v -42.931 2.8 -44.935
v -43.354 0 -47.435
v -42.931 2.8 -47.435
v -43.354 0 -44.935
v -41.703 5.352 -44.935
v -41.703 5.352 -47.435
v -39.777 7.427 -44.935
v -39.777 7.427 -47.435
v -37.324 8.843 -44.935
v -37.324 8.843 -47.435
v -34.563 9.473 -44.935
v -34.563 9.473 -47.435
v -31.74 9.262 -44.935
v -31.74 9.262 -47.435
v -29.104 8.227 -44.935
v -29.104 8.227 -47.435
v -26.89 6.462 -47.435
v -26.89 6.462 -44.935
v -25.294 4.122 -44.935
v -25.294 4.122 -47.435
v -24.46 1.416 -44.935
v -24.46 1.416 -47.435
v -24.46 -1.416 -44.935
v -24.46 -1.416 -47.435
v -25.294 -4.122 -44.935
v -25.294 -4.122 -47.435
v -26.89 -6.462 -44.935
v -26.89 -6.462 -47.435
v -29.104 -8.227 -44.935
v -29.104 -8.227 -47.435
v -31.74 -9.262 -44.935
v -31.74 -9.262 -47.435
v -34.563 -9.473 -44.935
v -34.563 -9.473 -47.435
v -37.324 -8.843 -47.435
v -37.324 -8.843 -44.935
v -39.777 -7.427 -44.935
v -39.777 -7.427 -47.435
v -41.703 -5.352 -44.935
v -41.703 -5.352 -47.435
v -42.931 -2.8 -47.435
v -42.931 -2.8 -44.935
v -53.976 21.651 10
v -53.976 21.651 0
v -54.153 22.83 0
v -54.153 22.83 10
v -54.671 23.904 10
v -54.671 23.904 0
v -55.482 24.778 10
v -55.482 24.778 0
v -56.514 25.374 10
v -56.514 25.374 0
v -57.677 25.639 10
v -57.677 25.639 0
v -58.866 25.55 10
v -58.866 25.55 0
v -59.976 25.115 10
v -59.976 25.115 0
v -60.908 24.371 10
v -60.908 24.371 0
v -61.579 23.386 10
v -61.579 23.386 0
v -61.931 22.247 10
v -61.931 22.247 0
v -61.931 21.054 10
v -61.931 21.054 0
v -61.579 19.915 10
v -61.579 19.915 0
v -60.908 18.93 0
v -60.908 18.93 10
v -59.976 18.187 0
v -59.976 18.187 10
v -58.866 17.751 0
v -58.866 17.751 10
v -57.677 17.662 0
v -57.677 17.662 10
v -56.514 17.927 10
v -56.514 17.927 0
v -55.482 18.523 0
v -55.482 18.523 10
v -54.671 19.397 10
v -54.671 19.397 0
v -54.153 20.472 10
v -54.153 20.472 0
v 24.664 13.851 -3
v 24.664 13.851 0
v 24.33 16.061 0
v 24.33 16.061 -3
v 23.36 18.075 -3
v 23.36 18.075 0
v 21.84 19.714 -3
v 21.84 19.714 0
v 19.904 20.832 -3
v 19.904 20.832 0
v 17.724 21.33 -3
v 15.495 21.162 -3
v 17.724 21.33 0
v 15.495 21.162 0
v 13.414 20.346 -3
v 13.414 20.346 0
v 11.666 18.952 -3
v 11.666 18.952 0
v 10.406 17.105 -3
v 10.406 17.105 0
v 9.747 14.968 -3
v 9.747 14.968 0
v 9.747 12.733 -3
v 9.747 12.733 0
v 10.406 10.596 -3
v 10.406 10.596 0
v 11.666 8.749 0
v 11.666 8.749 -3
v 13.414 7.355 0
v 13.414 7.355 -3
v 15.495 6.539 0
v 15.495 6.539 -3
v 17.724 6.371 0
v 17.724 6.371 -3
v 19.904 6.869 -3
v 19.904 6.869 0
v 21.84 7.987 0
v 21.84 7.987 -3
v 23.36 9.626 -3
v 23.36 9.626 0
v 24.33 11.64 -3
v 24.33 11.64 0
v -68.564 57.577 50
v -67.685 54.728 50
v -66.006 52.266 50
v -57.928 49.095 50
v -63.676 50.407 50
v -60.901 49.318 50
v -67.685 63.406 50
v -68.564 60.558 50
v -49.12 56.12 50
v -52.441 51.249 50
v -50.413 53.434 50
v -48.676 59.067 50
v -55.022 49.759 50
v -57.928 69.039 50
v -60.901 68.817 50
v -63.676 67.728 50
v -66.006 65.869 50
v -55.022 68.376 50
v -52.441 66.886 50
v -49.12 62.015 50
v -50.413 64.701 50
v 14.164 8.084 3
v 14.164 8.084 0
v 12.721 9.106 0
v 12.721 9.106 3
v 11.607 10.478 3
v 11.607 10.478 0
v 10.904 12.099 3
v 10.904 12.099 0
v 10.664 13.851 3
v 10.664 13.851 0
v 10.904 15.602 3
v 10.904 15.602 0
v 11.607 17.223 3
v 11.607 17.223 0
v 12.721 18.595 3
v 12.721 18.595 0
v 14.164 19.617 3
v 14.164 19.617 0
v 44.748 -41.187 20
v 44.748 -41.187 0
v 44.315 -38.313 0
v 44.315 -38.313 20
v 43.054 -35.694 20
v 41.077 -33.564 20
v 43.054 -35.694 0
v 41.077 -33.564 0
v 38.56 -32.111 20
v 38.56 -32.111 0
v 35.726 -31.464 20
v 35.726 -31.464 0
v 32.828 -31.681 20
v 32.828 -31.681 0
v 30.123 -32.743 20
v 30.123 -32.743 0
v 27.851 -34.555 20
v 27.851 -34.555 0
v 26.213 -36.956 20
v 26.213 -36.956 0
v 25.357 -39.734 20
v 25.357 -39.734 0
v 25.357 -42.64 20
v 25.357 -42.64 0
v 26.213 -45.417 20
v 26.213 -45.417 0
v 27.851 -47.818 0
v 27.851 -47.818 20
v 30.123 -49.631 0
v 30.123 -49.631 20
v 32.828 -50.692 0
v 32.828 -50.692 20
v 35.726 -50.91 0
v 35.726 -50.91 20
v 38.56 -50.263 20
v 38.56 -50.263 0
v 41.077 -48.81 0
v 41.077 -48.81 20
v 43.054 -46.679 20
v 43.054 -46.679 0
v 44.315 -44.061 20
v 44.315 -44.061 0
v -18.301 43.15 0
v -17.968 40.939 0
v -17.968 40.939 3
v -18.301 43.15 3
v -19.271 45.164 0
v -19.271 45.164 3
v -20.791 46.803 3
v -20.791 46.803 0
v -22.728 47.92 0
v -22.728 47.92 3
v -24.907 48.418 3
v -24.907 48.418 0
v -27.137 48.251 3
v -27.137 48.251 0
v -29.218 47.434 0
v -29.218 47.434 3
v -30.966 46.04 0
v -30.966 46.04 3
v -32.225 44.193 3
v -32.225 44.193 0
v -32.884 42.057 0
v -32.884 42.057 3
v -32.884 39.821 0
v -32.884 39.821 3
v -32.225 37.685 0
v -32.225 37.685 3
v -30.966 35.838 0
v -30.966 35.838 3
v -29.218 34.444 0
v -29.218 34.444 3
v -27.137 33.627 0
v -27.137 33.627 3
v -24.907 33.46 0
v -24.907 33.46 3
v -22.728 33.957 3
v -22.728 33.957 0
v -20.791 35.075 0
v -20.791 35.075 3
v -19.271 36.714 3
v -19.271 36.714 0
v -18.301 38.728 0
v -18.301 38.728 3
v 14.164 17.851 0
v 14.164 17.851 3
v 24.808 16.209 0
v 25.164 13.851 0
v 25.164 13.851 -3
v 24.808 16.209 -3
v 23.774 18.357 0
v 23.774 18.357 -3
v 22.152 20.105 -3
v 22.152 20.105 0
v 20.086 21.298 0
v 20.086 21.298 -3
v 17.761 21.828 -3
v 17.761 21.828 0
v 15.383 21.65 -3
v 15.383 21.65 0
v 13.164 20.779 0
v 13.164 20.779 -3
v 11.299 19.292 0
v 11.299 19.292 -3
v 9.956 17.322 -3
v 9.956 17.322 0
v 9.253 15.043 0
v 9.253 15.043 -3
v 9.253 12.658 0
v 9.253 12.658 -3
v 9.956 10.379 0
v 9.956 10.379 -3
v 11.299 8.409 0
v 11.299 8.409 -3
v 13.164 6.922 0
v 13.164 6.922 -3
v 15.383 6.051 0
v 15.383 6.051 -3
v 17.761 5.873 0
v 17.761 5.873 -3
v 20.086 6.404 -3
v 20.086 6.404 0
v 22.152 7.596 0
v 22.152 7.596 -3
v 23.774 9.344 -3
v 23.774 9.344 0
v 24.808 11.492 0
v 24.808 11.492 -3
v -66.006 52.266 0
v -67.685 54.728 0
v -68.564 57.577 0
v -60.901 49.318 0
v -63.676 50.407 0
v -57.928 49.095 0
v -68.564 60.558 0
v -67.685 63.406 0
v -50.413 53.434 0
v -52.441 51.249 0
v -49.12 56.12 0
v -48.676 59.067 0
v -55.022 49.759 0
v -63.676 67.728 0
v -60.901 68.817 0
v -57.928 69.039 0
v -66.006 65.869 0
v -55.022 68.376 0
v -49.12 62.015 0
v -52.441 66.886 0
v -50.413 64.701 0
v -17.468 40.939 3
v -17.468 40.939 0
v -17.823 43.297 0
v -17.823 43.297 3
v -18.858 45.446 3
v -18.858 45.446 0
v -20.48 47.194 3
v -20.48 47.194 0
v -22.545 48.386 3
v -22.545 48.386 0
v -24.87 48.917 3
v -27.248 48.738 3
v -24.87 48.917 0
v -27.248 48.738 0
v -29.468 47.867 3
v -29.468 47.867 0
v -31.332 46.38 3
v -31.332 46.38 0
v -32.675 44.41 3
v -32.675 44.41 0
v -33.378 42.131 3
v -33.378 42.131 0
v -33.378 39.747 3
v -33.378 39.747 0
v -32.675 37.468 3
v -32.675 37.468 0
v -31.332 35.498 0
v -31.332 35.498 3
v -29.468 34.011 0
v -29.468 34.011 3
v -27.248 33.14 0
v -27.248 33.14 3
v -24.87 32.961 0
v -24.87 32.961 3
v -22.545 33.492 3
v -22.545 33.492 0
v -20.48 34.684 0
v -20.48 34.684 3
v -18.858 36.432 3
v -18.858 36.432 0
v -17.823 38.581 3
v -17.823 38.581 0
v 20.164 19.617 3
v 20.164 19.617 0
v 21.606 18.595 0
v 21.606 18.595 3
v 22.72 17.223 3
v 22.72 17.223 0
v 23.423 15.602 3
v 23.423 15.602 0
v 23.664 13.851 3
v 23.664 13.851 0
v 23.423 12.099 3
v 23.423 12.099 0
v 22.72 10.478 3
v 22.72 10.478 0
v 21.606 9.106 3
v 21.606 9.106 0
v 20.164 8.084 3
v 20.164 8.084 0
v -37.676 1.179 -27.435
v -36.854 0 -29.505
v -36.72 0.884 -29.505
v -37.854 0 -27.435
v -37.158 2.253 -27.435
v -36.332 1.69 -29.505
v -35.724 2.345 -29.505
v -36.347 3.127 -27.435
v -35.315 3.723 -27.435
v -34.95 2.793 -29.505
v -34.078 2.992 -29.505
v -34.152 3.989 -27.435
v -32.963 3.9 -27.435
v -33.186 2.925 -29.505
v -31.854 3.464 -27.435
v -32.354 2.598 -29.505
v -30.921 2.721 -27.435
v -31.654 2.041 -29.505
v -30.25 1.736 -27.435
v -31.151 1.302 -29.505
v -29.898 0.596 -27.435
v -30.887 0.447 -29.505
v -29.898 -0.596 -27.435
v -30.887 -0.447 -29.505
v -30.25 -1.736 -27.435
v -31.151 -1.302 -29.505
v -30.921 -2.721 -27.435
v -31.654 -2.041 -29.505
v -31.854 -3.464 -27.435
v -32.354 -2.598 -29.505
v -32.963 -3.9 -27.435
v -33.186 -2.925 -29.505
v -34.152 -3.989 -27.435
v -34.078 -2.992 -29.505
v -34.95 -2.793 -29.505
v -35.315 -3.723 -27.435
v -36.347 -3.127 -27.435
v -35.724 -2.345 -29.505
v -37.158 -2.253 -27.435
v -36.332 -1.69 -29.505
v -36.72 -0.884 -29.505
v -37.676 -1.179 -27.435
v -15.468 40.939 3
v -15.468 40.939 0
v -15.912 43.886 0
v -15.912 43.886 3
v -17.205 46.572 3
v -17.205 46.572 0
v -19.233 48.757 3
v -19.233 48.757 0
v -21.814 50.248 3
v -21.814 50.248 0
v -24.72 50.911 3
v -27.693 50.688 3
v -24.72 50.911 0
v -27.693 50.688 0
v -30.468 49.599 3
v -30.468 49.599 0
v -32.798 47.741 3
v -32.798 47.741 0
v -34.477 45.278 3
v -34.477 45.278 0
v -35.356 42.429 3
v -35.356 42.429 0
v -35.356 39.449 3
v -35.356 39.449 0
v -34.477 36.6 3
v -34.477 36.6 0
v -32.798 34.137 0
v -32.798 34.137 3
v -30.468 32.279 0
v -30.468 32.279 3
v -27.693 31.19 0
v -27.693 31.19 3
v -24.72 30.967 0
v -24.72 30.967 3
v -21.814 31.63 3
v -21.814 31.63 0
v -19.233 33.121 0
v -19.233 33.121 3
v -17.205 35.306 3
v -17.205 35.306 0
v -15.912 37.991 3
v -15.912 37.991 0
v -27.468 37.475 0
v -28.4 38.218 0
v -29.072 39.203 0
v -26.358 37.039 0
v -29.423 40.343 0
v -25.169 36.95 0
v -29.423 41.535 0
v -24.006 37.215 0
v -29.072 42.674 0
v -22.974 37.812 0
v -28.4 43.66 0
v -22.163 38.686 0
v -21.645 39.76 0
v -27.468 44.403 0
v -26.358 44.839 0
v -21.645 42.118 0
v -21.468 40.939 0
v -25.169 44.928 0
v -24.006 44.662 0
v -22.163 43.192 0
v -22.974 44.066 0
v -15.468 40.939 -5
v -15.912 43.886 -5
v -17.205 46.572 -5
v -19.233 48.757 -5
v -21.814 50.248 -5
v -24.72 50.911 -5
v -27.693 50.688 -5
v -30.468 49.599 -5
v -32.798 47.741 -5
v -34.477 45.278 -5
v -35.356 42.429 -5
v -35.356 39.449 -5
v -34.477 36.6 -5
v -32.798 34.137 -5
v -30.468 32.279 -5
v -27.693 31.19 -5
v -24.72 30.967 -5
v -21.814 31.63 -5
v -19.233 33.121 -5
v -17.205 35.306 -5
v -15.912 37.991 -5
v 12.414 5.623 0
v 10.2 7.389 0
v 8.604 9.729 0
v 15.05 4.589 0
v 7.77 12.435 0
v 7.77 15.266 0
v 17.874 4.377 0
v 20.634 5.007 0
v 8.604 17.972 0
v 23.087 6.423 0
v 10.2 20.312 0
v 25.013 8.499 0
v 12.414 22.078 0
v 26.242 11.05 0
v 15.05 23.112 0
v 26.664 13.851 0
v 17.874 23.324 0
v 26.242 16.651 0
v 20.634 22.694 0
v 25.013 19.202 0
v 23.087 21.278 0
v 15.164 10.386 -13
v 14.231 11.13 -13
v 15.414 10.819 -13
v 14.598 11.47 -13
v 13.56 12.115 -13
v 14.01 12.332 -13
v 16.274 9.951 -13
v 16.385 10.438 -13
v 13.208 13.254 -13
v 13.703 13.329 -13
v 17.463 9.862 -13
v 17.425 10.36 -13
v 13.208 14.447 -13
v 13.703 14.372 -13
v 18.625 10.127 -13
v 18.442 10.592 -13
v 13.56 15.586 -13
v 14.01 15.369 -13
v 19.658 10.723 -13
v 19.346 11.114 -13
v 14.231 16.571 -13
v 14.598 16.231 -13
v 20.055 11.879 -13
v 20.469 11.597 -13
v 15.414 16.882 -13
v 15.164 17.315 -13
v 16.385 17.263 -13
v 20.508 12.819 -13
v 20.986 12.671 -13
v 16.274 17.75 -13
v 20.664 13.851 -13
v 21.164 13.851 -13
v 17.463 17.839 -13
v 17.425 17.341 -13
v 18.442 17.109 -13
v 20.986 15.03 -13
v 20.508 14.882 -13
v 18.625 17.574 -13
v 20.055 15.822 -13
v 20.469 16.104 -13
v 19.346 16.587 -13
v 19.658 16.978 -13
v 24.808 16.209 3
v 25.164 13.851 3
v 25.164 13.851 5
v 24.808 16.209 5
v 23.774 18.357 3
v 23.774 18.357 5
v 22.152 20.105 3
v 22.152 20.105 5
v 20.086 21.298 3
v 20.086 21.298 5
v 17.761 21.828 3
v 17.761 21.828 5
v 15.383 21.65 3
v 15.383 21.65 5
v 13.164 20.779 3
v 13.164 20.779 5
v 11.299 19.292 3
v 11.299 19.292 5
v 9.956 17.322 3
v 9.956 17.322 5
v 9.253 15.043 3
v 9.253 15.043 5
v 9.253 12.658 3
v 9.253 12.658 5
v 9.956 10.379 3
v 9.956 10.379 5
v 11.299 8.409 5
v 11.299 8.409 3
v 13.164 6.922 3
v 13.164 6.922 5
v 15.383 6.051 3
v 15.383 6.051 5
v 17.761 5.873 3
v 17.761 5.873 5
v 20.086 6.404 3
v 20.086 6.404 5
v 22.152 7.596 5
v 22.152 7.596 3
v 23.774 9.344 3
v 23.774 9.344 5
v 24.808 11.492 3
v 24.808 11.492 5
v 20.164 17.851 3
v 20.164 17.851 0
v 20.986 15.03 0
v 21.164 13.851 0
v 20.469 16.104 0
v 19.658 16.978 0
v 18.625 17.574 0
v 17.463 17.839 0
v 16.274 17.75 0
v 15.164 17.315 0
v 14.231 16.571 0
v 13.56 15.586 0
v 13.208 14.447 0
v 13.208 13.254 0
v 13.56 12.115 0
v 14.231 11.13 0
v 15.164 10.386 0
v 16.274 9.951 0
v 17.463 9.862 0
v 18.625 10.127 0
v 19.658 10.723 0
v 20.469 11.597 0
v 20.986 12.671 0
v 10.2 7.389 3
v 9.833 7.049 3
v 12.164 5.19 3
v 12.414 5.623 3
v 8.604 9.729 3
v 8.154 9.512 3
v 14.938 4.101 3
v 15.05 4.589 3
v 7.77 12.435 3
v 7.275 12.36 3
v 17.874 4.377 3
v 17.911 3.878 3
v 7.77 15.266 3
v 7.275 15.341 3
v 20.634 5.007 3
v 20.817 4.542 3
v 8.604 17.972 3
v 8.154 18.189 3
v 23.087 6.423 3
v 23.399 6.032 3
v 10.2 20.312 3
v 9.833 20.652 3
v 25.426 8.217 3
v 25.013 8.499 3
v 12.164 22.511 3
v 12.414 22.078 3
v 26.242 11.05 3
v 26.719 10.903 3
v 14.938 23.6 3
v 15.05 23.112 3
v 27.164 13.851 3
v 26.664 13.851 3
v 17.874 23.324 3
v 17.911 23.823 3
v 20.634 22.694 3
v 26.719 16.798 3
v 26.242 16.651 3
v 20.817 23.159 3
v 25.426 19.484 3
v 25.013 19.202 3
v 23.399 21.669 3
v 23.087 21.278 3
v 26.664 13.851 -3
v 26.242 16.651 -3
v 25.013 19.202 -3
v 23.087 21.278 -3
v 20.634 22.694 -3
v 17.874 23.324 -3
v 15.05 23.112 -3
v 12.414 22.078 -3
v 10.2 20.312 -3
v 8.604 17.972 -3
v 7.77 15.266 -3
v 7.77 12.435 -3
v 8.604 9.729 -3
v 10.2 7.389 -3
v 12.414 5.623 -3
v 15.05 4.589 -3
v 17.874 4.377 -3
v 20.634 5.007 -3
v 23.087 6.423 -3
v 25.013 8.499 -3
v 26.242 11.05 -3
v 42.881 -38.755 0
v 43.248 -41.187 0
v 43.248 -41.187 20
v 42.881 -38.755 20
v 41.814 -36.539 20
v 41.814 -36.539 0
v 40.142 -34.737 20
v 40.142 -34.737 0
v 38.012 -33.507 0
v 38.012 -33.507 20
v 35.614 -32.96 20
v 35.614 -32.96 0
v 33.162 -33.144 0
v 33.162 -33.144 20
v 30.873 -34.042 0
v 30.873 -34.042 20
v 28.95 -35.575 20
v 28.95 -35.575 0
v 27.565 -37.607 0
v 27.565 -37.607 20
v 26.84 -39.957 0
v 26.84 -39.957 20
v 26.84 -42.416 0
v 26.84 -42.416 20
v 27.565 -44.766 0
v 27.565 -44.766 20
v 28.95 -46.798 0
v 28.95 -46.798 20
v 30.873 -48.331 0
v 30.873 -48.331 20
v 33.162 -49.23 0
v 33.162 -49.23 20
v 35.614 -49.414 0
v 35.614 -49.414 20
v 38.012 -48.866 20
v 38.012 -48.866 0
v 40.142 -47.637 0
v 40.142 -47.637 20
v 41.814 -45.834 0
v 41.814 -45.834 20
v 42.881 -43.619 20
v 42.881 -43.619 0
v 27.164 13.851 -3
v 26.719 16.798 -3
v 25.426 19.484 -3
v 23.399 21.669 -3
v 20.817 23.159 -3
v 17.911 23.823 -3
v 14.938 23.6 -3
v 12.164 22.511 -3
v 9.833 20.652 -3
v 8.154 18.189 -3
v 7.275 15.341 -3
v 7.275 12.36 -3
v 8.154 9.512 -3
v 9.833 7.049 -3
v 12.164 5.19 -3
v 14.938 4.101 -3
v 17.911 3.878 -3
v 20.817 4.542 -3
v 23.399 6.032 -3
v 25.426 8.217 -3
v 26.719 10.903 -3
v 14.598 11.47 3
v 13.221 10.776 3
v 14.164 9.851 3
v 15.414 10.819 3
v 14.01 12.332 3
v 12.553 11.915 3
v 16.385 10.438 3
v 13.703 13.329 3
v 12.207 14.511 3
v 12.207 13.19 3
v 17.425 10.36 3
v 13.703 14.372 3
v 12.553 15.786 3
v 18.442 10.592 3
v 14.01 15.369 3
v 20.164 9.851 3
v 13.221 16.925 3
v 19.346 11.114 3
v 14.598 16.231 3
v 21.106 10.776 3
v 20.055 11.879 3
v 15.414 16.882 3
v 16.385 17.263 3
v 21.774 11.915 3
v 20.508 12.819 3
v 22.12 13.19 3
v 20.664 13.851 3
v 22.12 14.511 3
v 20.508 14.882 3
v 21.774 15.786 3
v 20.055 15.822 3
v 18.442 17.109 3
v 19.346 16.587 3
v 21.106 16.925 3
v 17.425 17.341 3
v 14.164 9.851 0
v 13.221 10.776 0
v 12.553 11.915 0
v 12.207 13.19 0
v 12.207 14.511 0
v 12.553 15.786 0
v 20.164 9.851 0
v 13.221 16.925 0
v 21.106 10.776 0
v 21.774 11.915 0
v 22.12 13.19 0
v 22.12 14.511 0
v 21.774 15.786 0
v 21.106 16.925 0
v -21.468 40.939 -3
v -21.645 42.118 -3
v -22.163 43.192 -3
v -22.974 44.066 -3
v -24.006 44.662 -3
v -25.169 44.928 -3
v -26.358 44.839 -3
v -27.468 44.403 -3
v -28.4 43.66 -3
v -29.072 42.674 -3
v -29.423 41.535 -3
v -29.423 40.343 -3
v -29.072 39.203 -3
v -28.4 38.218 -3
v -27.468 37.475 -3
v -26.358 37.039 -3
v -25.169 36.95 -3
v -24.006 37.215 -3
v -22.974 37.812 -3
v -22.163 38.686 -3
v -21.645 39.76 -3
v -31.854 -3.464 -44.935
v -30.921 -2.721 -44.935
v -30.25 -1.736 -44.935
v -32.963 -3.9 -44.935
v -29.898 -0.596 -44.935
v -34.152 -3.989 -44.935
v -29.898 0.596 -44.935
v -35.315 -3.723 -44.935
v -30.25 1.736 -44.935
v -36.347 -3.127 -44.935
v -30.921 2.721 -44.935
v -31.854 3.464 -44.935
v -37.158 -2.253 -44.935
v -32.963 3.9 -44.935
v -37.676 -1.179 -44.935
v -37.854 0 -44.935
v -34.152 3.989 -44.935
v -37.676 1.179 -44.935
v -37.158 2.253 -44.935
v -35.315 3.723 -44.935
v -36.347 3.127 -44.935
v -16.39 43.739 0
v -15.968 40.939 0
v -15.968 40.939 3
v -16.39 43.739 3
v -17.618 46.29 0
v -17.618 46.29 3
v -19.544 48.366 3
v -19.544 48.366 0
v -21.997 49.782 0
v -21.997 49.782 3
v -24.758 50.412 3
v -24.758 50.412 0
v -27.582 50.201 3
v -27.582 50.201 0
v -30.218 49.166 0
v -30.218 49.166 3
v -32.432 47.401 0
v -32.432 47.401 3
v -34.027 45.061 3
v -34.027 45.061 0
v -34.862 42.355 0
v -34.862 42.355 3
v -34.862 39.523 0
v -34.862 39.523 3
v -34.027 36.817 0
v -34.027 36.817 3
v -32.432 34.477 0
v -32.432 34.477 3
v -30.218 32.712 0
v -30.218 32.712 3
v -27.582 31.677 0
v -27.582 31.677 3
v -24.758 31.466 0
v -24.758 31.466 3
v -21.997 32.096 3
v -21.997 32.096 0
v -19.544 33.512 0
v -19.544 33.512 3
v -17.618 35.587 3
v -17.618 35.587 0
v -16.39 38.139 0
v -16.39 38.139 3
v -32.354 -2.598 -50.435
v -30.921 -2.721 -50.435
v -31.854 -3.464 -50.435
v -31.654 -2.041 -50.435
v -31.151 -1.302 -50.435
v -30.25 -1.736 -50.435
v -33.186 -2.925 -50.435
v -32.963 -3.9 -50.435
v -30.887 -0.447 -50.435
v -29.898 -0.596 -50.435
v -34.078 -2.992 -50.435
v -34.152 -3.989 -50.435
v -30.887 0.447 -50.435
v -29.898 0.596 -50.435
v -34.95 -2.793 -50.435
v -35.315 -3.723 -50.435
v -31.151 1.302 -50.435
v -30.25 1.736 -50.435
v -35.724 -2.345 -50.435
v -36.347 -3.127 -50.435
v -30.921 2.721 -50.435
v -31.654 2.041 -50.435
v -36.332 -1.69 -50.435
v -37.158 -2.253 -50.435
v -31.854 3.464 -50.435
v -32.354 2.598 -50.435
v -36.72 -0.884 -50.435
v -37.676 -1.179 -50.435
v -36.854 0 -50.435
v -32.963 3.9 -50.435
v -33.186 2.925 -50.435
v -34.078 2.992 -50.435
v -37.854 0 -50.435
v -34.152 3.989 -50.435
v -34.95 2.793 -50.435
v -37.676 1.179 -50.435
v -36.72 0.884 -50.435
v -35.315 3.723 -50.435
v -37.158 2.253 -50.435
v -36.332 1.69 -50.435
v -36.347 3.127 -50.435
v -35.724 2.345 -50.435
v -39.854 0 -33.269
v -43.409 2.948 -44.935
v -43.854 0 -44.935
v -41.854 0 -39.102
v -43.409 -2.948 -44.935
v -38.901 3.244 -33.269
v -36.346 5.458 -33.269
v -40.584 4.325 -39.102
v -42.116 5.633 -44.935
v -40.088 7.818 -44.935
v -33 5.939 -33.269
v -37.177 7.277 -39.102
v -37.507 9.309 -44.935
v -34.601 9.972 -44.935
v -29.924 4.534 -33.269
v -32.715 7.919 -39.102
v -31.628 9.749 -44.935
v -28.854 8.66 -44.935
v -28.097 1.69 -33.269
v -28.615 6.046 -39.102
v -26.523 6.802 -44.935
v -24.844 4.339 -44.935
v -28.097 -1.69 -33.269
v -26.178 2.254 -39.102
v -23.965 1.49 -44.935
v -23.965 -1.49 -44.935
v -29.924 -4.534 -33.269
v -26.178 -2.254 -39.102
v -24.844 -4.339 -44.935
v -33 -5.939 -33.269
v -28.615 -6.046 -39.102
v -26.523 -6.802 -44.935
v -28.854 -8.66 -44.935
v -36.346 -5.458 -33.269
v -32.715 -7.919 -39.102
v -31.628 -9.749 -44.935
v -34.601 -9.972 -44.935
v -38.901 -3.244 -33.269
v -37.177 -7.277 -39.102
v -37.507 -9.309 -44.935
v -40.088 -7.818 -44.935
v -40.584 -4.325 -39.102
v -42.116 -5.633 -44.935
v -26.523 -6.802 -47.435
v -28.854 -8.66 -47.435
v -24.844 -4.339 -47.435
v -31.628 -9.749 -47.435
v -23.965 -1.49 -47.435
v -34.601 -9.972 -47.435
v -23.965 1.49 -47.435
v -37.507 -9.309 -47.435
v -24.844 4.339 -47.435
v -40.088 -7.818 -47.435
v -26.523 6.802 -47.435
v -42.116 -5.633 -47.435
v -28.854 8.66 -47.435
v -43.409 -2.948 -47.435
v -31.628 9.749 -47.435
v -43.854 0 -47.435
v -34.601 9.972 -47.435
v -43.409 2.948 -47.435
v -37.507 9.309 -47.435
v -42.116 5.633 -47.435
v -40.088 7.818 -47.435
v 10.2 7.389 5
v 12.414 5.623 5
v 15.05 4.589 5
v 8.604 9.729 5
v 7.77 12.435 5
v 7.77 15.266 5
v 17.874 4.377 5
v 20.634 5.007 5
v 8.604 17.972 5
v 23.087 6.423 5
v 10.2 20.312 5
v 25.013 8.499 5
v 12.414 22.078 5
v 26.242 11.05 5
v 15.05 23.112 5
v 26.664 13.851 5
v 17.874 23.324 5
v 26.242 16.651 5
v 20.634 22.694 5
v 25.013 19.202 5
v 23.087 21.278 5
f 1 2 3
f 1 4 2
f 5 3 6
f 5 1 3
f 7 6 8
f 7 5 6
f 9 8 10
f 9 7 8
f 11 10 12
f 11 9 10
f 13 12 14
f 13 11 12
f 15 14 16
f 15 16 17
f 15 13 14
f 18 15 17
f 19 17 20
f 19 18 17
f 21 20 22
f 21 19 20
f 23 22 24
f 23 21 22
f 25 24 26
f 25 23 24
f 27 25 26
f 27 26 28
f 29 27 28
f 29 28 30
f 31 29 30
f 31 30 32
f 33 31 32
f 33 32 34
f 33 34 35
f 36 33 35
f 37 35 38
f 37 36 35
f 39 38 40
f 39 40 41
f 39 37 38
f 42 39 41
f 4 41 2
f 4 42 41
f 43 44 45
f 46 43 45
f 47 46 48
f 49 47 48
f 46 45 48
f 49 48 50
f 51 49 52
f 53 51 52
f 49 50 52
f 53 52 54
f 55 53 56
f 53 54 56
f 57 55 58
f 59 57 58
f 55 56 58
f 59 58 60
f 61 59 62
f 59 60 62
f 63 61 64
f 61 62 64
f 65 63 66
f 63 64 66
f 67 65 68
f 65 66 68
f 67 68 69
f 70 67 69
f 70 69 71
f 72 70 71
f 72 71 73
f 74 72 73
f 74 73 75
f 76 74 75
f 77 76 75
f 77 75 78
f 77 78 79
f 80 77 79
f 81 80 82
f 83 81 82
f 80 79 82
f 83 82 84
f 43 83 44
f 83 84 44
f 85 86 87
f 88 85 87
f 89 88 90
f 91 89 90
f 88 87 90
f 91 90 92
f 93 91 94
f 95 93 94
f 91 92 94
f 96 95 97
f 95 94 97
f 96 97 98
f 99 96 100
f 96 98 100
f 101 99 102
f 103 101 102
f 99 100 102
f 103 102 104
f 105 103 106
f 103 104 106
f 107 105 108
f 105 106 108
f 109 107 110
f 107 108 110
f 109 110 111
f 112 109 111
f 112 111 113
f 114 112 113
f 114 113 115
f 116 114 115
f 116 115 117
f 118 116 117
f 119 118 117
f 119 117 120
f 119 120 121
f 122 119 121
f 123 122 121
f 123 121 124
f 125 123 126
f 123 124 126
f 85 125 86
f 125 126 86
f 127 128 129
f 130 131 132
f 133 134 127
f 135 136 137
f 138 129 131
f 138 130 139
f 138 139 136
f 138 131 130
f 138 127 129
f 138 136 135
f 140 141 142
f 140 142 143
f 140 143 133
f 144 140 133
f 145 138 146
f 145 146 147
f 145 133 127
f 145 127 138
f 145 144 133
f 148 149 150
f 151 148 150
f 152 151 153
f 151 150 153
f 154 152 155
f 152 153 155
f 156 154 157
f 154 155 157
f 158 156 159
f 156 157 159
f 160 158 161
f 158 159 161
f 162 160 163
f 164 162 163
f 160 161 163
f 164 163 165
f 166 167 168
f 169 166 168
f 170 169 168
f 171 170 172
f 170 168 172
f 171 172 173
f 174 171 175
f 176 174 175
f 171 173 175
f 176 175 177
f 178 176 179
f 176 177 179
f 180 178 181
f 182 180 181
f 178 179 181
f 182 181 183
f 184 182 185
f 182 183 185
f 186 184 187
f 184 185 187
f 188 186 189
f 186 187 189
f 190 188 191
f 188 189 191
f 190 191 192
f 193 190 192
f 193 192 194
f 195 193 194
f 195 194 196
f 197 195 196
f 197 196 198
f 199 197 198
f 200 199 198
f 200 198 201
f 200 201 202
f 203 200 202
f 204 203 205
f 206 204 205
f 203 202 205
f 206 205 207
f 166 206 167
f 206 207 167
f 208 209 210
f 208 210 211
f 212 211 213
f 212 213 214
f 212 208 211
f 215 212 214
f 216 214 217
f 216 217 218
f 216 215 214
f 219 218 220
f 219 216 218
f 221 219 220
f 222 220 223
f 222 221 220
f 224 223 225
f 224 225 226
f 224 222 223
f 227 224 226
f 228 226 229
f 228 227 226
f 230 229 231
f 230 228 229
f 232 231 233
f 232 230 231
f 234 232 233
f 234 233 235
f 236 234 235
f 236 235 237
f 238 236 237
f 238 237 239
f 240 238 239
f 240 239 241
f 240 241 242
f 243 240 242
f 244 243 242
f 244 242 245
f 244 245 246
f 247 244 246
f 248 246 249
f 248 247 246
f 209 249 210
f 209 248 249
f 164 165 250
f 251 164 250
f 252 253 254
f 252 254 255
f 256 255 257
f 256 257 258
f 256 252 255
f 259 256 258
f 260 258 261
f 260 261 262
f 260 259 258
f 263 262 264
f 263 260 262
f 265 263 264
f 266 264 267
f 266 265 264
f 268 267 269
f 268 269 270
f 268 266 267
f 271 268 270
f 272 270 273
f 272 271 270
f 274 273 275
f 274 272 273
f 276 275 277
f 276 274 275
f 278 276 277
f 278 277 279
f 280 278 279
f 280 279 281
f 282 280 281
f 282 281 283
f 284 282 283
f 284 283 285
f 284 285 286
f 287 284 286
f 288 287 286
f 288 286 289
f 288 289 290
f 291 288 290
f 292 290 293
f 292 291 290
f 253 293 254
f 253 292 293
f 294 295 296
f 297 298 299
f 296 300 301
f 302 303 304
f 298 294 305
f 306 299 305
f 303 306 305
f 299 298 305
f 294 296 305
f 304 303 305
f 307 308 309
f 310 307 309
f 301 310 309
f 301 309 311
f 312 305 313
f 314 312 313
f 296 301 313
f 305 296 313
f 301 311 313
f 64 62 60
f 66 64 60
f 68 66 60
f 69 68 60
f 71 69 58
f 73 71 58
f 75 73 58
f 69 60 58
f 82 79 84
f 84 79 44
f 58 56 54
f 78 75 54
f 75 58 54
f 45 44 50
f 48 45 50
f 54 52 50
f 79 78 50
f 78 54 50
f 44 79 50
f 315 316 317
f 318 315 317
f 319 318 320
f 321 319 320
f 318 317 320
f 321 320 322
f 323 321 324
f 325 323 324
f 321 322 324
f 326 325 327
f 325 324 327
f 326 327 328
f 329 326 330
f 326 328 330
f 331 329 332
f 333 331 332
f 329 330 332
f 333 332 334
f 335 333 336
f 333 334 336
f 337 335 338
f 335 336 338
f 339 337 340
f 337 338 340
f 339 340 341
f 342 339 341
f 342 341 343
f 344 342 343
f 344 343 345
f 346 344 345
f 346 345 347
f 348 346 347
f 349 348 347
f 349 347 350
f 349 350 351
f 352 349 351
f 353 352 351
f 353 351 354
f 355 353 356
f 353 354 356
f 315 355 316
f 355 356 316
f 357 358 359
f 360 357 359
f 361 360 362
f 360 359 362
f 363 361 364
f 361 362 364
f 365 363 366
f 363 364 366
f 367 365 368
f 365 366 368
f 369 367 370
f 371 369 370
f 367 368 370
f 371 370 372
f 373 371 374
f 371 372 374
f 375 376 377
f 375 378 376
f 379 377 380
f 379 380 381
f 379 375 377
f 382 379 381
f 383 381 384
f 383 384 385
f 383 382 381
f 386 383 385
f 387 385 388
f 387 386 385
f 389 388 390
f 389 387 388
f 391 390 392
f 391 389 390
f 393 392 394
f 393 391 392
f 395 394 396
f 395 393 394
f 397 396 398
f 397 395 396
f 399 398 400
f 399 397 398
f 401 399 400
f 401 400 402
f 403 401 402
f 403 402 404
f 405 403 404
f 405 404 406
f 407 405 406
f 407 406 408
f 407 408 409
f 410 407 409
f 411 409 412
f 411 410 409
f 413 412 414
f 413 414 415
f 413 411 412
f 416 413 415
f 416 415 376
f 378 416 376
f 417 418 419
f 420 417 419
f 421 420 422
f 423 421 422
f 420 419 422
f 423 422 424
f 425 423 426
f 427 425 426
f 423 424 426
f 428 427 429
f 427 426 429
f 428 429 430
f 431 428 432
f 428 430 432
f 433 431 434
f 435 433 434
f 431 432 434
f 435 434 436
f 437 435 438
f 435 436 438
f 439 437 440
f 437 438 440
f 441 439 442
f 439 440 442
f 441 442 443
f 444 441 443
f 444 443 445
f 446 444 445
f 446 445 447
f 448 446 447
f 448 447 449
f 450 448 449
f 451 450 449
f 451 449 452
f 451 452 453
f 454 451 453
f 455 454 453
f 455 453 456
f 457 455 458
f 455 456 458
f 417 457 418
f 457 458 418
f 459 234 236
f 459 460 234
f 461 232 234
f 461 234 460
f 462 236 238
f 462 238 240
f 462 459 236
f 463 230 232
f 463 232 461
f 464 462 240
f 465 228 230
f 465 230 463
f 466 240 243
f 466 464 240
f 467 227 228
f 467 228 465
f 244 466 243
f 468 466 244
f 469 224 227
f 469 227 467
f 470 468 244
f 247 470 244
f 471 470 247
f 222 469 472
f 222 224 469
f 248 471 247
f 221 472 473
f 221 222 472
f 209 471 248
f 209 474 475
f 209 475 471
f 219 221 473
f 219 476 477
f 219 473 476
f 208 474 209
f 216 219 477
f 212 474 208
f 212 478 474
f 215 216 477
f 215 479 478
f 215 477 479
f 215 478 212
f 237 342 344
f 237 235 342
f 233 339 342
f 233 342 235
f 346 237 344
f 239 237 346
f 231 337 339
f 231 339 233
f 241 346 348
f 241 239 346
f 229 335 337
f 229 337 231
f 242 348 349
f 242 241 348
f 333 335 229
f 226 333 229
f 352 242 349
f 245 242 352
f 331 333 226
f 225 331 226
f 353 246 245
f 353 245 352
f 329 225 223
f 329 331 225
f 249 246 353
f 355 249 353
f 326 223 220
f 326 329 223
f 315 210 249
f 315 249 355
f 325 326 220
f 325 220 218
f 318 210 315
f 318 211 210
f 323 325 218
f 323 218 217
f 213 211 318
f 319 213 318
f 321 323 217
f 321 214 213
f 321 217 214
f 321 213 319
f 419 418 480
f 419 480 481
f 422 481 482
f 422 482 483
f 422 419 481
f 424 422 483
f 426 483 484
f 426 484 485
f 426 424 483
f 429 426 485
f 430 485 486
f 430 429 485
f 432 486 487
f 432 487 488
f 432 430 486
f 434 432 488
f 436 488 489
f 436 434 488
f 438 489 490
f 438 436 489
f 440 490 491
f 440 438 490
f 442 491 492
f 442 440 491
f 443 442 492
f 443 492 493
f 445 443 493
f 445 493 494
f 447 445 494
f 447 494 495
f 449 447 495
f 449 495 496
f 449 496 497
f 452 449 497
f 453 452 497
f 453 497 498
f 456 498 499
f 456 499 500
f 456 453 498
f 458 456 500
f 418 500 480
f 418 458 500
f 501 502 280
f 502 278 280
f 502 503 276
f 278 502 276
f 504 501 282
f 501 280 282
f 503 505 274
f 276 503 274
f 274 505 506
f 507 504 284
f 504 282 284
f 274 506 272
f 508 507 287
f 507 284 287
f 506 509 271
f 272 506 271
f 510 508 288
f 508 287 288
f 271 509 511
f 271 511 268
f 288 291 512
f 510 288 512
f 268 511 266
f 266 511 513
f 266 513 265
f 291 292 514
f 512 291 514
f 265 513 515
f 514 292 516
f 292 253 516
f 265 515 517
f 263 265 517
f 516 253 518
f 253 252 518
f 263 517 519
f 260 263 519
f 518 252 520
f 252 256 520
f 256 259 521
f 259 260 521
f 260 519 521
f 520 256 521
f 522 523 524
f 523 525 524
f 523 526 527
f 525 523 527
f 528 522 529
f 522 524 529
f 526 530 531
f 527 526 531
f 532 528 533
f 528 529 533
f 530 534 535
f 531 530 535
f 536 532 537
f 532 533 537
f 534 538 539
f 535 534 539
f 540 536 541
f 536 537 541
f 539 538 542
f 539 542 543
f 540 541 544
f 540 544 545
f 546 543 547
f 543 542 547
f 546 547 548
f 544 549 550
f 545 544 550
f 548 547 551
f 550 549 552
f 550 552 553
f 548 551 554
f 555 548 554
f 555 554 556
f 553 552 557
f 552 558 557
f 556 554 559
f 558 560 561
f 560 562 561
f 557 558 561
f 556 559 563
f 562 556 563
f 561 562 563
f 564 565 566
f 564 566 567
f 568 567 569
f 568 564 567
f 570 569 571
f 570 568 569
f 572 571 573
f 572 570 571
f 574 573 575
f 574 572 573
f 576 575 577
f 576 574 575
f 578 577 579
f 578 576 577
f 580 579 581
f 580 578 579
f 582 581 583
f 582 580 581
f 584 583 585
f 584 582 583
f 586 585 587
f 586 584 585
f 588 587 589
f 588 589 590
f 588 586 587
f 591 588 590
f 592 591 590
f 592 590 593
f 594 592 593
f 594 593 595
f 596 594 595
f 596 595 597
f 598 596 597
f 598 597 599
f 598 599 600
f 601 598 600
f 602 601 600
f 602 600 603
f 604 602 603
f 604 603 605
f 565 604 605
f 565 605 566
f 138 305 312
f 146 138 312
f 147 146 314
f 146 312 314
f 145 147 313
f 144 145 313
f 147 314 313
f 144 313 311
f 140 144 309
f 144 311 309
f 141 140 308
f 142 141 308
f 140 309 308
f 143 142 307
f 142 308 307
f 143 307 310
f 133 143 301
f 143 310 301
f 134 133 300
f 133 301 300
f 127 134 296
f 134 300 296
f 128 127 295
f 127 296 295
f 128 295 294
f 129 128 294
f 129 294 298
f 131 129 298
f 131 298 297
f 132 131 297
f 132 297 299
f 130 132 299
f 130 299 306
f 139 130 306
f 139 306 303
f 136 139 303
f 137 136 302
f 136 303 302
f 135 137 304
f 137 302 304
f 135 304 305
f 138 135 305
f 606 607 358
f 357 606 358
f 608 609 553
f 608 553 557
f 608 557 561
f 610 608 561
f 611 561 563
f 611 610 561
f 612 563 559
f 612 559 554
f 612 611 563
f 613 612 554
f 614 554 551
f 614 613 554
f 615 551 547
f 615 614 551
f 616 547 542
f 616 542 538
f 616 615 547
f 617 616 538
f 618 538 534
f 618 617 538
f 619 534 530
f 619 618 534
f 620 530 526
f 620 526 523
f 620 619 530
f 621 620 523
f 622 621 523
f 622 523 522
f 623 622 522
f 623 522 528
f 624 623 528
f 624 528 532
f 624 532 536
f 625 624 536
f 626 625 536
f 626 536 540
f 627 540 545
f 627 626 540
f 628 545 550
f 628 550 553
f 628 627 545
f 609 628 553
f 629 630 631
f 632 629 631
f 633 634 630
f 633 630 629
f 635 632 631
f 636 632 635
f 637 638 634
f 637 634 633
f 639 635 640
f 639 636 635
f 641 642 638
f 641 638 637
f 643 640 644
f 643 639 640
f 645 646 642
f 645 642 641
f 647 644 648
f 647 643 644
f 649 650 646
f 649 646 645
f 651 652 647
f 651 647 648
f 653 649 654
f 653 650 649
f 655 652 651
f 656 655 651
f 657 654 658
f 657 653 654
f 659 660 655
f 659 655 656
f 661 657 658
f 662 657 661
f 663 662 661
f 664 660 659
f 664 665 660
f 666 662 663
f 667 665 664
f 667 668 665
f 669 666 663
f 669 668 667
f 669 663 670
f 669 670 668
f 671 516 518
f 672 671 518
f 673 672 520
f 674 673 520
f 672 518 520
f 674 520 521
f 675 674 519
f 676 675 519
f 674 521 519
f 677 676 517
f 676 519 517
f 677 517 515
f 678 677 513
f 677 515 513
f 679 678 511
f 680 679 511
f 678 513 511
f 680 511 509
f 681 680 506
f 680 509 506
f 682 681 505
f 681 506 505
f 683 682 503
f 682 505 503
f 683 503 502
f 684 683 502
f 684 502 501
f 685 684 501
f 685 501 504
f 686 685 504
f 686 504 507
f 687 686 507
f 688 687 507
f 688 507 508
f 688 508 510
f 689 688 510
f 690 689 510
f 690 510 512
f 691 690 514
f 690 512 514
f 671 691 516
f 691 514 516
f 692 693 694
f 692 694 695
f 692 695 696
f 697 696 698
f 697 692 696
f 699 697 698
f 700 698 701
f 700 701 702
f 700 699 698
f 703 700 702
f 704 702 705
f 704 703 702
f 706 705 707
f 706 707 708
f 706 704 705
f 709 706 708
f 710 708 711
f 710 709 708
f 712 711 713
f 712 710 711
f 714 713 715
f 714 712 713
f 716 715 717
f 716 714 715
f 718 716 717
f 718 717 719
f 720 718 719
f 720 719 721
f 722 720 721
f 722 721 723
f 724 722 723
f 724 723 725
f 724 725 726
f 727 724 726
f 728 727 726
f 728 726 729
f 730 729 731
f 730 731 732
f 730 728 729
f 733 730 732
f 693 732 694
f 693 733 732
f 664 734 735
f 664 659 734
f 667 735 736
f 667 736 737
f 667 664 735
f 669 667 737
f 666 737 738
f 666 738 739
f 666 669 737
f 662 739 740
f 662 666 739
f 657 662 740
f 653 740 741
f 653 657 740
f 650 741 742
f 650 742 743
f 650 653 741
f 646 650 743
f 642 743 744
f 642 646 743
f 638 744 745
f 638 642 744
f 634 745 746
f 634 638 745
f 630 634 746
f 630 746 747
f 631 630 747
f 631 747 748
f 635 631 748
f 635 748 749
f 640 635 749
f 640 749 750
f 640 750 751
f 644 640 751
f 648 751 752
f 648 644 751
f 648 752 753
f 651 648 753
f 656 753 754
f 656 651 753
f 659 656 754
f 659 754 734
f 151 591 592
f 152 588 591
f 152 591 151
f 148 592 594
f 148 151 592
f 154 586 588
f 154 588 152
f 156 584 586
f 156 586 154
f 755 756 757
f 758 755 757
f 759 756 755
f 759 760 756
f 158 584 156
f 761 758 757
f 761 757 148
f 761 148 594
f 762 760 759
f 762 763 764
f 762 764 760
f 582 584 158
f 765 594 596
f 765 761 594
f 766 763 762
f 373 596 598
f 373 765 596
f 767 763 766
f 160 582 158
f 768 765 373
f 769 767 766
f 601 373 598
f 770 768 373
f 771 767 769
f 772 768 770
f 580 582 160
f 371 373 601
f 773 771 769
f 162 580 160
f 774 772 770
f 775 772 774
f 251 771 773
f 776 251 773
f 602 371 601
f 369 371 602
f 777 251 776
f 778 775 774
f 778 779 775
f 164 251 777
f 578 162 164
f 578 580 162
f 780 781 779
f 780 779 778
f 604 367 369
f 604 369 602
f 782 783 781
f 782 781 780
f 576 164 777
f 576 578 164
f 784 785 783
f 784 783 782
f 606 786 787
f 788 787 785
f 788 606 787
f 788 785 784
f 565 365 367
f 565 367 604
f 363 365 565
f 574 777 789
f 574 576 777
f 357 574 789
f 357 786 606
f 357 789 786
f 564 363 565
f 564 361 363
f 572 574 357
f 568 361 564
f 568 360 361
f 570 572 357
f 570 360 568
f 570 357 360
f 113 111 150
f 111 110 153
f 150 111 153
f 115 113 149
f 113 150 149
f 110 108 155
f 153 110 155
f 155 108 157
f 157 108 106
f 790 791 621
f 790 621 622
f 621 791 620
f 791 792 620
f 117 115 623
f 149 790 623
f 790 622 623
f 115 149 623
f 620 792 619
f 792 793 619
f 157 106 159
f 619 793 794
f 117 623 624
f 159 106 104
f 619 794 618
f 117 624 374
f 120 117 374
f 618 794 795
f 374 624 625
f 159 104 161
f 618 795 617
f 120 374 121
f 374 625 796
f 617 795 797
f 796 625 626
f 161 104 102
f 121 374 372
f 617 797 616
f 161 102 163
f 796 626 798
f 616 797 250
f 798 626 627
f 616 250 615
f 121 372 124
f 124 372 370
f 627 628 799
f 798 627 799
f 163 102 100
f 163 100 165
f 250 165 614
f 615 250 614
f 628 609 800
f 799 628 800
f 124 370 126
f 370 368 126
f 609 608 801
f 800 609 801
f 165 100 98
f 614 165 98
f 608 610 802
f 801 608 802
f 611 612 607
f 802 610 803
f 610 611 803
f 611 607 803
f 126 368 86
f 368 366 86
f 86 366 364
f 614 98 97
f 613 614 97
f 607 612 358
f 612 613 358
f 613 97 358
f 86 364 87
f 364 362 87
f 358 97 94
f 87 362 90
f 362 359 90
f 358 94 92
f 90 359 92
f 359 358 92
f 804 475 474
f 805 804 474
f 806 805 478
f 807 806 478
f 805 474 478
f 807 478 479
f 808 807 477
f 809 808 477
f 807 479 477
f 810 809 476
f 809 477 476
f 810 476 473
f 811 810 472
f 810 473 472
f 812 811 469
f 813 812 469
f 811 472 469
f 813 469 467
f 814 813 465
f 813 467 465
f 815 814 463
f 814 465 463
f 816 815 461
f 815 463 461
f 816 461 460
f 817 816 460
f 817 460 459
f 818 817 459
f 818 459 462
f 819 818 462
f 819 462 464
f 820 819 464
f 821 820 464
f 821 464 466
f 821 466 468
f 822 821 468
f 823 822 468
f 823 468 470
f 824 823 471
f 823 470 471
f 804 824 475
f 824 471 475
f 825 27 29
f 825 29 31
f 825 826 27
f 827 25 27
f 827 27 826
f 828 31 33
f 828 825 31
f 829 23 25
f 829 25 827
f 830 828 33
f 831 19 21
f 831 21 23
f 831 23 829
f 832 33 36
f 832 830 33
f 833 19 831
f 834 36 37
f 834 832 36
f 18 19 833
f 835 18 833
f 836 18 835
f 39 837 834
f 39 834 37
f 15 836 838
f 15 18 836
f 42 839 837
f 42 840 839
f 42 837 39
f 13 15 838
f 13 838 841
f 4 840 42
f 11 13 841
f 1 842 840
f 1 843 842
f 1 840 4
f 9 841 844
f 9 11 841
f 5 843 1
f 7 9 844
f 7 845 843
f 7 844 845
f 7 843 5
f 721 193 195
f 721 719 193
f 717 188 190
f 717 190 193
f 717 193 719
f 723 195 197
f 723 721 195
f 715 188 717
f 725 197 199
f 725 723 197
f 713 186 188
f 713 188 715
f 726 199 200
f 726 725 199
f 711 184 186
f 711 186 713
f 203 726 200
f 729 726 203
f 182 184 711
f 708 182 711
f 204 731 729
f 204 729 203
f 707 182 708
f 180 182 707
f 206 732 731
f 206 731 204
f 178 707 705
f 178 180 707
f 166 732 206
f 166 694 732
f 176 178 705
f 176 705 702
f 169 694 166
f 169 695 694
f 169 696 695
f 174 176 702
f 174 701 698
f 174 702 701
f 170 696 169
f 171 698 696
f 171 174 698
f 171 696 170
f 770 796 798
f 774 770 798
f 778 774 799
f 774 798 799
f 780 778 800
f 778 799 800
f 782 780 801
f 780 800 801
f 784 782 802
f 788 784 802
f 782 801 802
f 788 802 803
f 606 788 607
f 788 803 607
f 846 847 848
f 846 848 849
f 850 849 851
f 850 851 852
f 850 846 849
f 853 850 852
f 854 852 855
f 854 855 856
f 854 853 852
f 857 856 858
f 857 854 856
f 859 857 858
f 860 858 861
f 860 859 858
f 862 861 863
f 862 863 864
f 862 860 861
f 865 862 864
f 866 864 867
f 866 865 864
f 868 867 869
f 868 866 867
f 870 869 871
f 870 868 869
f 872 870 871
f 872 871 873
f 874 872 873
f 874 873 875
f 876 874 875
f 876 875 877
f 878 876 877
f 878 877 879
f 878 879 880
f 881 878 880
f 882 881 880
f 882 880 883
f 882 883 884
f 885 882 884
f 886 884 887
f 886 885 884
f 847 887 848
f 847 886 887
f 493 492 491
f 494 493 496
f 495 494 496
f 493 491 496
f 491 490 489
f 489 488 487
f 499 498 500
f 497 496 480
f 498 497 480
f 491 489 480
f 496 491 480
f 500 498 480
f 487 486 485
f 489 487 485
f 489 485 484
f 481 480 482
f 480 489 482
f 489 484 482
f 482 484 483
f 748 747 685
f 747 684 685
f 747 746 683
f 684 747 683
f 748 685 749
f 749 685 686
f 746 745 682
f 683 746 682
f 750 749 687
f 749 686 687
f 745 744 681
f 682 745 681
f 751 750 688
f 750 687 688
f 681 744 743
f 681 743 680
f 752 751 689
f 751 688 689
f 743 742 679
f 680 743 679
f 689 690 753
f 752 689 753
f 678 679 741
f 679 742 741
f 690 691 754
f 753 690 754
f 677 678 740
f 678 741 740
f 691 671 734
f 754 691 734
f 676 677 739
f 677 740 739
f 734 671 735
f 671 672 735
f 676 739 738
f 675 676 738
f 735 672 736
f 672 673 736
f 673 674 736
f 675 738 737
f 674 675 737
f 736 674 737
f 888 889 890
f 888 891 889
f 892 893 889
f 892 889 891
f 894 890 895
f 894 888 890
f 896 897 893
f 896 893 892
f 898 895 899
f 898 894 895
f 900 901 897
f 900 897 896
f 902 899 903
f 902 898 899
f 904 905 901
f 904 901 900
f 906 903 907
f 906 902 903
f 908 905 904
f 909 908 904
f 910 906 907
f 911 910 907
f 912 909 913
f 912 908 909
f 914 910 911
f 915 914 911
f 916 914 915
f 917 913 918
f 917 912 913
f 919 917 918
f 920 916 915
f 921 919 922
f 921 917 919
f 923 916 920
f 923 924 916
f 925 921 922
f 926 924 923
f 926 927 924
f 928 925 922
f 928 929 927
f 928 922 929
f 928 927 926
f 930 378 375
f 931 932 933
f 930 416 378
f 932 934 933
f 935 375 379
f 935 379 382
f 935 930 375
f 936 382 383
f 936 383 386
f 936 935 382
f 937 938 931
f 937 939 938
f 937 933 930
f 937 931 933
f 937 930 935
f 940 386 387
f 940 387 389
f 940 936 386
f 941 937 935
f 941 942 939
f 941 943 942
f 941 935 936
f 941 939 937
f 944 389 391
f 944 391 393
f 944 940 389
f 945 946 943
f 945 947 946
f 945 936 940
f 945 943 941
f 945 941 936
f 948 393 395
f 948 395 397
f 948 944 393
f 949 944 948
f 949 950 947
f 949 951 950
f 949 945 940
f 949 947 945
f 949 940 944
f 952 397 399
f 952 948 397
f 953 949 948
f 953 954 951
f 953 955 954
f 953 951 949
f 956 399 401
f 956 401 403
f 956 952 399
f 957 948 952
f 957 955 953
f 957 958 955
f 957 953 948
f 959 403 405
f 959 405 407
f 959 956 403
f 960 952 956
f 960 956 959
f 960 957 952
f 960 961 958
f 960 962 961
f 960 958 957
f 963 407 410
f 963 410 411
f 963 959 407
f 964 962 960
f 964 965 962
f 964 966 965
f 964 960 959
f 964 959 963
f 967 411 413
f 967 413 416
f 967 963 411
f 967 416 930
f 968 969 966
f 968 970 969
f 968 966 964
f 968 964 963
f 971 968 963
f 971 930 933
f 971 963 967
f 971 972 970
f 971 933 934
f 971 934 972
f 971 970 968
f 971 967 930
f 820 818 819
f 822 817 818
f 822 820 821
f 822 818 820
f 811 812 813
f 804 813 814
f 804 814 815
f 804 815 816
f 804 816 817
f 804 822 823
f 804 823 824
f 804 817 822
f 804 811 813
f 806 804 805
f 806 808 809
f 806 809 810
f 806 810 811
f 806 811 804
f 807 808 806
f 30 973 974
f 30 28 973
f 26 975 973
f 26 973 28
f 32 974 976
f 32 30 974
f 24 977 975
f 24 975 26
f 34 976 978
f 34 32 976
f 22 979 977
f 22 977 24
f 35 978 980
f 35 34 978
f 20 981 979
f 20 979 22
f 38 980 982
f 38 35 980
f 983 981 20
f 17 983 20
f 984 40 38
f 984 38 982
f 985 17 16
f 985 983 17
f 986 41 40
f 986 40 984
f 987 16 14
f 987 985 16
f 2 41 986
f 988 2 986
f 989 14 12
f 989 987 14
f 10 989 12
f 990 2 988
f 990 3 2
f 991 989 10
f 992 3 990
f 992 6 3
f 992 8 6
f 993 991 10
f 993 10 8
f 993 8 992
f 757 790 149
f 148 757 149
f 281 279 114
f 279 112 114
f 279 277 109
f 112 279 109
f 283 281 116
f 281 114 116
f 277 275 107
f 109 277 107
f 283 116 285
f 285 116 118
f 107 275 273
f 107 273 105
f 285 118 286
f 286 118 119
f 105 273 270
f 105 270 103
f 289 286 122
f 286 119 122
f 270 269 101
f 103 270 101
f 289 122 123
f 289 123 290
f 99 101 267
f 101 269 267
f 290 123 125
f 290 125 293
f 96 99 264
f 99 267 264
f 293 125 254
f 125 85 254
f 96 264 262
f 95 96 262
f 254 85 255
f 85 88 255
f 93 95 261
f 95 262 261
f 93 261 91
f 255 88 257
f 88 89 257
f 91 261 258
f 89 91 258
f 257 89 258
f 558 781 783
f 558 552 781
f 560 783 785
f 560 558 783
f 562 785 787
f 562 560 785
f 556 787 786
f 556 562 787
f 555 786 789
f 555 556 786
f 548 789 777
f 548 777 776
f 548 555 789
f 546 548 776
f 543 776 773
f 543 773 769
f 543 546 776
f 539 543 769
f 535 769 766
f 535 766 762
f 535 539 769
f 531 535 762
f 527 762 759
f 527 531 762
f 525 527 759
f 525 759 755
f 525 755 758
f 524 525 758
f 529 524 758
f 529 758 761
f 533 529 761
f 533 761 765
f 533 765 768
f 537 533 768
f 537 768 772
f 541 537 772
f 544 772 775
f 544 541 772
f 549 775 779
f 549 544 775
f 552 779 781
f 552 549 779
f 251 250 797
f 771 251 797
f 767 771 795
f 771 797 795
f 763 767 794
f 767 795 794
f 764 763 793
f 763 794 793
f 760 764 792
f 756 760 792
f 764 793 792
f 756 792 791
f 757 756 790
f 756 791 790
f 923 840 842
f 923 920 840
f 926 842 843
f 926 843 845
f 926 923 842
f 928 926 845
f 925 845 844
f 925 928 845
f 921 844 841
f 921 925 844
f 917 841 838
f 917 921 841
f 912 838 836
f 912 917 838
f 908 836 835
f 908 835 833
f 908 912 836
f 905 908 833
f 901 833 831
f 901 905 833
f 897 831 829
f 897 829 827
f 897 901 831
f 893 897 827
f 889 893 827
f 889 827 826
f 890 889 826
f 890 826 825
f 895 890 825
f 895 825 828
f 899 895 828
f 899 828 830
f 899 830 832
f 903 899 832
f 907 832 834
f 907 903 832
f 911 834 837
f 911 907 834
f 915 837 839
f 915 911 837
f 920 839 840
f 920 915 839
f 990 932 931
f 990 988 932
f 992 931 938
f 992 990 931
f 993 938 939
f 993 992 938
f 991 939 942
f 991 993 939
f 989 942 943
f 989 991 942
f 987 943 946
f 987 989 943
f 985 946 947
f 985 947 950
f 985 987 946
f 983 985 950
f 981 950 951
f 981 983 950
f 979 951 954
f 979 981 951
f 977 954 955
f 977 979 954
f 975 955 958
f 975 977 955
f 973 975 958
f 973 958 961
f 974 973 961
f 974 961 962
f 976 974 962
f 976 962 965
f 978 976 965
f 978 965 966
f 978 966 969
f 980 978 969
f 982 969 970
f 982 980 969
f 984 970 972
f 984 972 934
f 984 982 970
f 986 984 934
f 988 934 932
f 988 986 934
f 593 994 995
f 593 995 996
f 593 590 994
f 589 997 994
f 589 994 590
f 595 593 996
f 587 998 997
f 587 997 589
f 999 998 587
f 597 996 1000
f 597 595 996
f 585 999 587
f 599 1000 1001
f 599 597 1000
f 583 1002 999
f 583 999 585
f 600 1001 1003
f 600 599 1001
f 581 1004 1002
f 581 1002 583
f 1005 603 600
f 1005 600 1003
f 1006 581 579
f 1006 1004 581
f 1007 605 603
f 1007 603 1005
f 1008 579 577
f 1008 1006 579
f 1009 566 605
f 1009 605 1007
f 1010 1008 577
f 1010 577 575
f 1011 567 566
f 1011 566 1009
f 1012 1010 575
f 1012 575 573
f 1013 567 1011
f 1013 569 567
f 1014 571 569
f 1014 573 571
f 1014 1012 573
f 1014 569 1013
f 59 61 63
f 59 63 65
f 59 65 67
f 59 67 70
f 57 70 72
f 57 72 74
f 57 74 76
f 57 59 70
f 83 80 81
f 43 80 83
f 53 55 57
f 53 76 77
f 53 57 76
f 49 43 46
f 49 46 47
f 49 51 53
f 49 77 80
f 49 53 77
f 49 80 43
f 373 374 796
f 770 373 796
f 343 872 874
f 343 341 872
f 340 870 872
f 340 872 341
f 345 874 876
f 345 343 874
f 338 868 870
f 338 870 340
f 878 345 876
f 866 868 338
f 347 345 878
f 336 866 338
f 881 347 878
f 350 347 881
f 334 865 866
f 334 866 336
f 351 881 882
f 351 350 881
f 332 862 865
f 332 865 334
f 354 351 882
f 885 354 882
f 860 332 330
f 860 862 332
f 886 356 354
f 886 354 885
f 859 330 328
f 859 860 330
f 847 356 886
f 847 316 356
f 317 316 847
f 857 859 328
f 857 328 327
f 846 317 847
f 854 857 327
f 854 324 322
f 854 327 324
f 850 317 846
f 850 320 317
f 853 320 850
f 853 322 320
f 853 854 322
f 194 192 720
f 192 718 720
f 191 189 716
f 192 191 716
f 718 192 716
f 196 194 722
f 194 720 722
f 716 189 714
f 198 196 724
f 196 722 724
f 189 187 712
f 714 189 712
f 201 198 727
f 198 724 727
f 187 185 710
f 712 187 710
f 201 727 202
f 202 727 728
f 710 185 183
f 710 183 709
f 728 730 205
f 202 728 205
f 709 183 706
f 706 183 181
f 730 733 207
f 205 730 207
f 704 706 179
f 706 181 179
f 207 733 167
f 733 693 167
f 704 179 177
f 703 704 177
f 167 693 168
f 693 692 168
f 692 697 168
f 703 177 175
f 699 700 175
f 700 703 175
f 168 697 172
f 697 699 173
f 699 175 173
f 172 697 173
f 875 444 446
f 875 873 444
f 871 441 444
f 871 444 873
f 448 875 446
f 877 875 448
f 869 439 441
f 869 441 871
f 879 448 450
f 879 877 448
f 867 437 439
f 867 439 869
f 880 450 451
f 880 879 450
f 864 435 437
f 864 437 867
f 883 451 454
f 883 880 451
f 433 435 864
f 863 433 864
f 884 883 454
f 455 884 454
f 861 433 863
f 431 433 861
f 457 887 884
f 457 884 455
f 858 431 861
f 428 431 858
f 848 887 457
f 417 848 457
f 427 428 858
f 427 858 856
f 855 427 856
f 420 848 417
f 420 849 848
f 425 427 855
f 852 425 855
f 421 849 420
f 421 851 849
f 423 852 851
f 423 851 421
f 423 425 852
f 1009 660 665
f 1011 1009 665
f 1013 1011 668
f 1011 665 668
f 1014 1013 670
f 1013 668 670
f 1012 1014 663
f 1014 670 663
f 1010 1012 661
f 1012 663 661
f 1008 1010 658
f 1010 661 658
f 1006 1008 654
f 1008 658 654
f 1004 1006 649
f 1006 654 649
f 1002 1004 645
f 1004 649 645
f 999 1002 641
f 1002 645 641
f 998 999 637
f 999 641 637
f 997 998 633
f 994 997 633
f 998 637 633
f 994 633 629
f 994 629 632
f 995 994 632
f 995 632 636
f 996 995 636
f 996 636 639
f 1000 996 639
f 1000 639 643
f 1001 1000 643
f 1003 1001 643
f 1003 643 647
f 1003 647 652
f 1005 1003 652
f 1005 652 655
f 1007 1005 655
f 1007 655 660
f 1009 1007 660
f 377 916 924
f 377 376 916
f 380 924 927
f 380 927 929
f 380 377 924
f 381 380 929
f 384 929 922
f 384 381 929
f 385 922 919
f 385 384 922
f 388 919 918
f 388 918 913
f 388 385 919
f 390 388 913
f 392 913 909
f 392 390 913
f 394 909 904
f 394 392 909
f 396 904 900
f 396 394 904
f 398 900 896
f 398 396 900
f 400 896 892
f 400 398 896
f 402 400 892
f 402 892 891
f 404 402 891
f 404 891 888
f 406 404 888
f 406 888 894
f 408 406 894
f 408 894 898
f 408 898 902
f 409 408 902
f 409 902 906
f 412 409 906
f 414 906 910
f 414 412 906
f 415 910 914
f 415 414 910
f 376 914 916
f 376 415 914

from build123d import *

# Parameters (mm, degrees)
F0_R      = 10
F1_DEPTH  = 50
F2_R      = 10
F2_R_2    = 9.5
F2_R_3    = 8
F2_R_4    = 7.5
F2_R_5    = 4
F3_DEPTH  = 5
F4_DEPTH  = 3
F5_DEPTH  = 3
F6_R      = 4
F7_DEPTH  = 10
F8_R      = 10
F8_R_2    = 9.5
F8_R_3    = 8
F8_R_4    = 7.5
F8_R_5    = 4
F8_R_6    = 3.5
F9_DEPTH  = 3
F10_DEPTH = 3
F11_DEPTH = 13
F12_DEPTH = 5
F15_R     = 9.75
F15_R_2   = 8.25
F16_DEPTH = 20


with BuildPart() as f1:
    # F0 (on Top) → F1 (new body)
    with BuildSketch(Plane.XY):
        with Locations((-58.6755499244, 59.0673238039)):
            Circle(F0_R)
    extrude(amount=F1_DEPTH)


with BuildPart() as f3:
    # F2 (on Top) → F3 (new body)
    with BuildSketch(Plane.XY):
        with Locations((-25.4676453769, 40.9389398992)):
            Circle(F2_R)
        with Locations((-25.4676453769, 40.9389398992)):
            Circle(F2_R_2, mode=Mode.SUBTRACT)
        with Locations((-25.4676453769, 40.9389398992)):
            Circle(F2_R_2)
        with Locations((-25.4676453769, 40.9389398992)):
            Circle(F2_R_3, mode=Mode.SUBTRACT)
        with Locations((-25.4676453769, 40.9389398992)):
            Circle(F2_R_3)
        with Locations((-25.4676453769, 40.9389398992)):
            Circle(F2_R_4, mode=Mode.SUBTRACT)
        with Locations((-25.4676453769, 40.9389398992)):
            Circle(F2_R_4)
        with Locations((-25.4676453769, 40.9389398992)):
            Circle(F2_R_5, mode=Mode.SUBTRACT)
        with Locations((-25.4676453769, 40.9389398992)):
            Circle(F2_R_5)
    extrude(amount=-F3_DEPTH)

    # F2 (on Top) → F4 (join)
    with BuildSketch(Plane.XY):
        with Locations((-25.4676453769, 40.9389398992)):
            Circle(F2_R)
        with Locations((-25.4676453769, 40.9389398992)):
            Circle(F2_R_2, mode=Mode.SUBTRACT)
        with Locations((-25.4676453769, 40.9389398992)):
            Circle(F2_R_3)
        with Locations((-25.4676453769, 40.9389398992)):
            Circle(F2_R_4, mode=Mode.SUBTRACT)
    extrude(amount=F4_DEPTH)

    # F2 (on Top) → F5 (cut)
    with BuildSketch(Plane.XY):
        with Locations((-25.4676453769, 40.9389398992)):
            Circle(F2_R_5)
    extrude(amount=-F5_DEPTH, mode=Mode.SUBTRACT)


with BuildPart() as f7:
    # F6 (on Top) → F7 (new body)
    with BuildSketch(Plane.XY):
        with Locations((-57.975590229, 21.6506272554)):
            Circle(F6_R)
    extrude(amount=F7_DEPTH)


with BuildPart() as f9:
    # F8 (on Top) → F9 (new body)
    with BuildSketch(Plane.XY):
        with Locations((17.1636063606, 13.8505138457)):
            Circle(F8_R)
        with Locations((17.1636063606, 13.8505138457)):
            Circle(F8_R_2, mode=Mode.SUBTRACT)
        with Locations((17.1636063606, 13.8505138457)):
            Circle(F8_R_2)
        with Locations((17.1636063606, 13.8505138457)):
            Circle(F8_R_3, mode=Mode.SUBTRACT)
        with Locations((17.1636063606, 13.8505138457)):
            Circle(F8_R_3)
        with Locations((17.1636063606, 13.8505138457)):
            Circle(F8_R_4, mode=Mode.SUBTRACT)
        with Locations((17.1636063606, 13.8505138457)):
            Circle(F8_R_4)
        with BuildLine():
            ThreePointArc((14.1636063606, 8.0842325483), (10.6636063606, 13.8505138457), (14.1636063606, 19.616795143))
            Line((14.1636063606, 19.616795143), (14.1636063606, 17.8505138457))
            ThreePointArc((14.1636063606, 17.8505138457), (12.1636063606, 13.8505138457), (14.1636063606, 9.8505138457))
            Line((14.1636063606, 9.8505138457), (14.1636063606, 8.0842325483))
        make_face(mode=Mode.SUBTRACT)
        with Locations((17.1636063606, 13.8505138457)):
            Circle(F8_R_5, mode=Mode.SUBTRACT)
        with BuildLine():
            Line((20.1636063606, 8.0842325483), (20.1636063606, 9.8505138457))
            ThreePointArc((20.1636063606, 9.8505138457), (22.1636063606, 13.8505138457), (20.1636063606, 17.8505138457))
            Line((20.1636063606, 17.8505138457), (20.1636063606, 19.616795143))
            ThreePointArc((20.1636063606, 19.616795143), (23.6636063606, 13.8505138457), (20.1636063606, 8.0842325483))
        make_face(mode=Mode.SUBTRACT)
        with Locations((17.1636063606, 13.8505138457)):
            Circle(F8_R_5)
        with Locations((17.1636063606, 13.8505138457)):
            Circle(F8_R_6, mode=Mode.SUBTRACT)
    extrude(amount=F9_DEPTH)

    # F8 (on Top) → F10 (join)
    with BuildSketch(Plane.XY):
        with Locations((17.1636063606, 13.8505138457)):
            Circle(F8_R)
        with Locations((17.1636063606, 13.8505138457)):
            Circle(F8_R_2, mode=Mode.SUBTRACT)
        with Locations((17.1636063606, 13.8505138457)):
            Circle(F8_R_3)
        with Locations((17.1636063606, 13.8505138457)):
            Circle(F8_R_4, mode=Mode.SUBTRACT)
    extrude(amount=-F10_DEPTH)

    # F8 (on Top) → F11 (join)
    with BuildSketch(Plane.XY):
        with Locations((17.1636063606, 13.8505138457)):
            Circle(F8_R_5)
        with Locations((17.1636063606, 13.8505138457)):
            Circle(F8_R_6, mode=Mode.SUBTRACT)
    extrude(amount=-F11_DEPTH)

    # F8 (on Top) → F12 (join)
    with BuildSketch(Plane.XY):
        with Locations((17.1636063606, 13.8505138457)):
            Circle(F8_R_2)
        with Locations((17.1636063606, 13.8505138457)):
            Circle(F8_R_3, mode=Mode.SUBTRACT)
    extrude(amount=F12_DEPTH)


with BuildPart() as f14:
    # F13 (on Front) → F14 (revolve)
    with BuildSketch(Plane.XZ):
        Polygon((-43.8535261154, -44.9353833431), (-43.8535261154, -47.4353833431), (-43.3535261154, -47.4353833431), (-43.3535261154, -44.9353833431), (-37.8535261154, -44.9353833431), (-37.8535261154, -47.4353833431), (-37.8535261154, -50.4353833431), (-36.8535261154, -50.4353833431), (-36.8535261154, -47.4353833431), (-36.8535261154, -29.5051056892), (-37.8535261154, -27.4353833431), align=None)
    revolve(axis=Axis((-33.8535261154, 0, -37.4353833431), (0, 0, -1)))


with BuildPart() as f16:
    # F15 (on Top) → F16 (new body)
    with BuildSketch(Plane.XY):
        with Locations((34.997805953, -41.1867722869)):
            Circle(F15_R)
        with Locations((34.997805953, -41.1867722869)):
            Circle(F15_R_2, mode=Mode.SUBTRACT)
    extrude(amount=F16_DEPTH)


solid = Compound([f1.part, f3.part, f7.part, f9.part, f14.part, f16.part])
